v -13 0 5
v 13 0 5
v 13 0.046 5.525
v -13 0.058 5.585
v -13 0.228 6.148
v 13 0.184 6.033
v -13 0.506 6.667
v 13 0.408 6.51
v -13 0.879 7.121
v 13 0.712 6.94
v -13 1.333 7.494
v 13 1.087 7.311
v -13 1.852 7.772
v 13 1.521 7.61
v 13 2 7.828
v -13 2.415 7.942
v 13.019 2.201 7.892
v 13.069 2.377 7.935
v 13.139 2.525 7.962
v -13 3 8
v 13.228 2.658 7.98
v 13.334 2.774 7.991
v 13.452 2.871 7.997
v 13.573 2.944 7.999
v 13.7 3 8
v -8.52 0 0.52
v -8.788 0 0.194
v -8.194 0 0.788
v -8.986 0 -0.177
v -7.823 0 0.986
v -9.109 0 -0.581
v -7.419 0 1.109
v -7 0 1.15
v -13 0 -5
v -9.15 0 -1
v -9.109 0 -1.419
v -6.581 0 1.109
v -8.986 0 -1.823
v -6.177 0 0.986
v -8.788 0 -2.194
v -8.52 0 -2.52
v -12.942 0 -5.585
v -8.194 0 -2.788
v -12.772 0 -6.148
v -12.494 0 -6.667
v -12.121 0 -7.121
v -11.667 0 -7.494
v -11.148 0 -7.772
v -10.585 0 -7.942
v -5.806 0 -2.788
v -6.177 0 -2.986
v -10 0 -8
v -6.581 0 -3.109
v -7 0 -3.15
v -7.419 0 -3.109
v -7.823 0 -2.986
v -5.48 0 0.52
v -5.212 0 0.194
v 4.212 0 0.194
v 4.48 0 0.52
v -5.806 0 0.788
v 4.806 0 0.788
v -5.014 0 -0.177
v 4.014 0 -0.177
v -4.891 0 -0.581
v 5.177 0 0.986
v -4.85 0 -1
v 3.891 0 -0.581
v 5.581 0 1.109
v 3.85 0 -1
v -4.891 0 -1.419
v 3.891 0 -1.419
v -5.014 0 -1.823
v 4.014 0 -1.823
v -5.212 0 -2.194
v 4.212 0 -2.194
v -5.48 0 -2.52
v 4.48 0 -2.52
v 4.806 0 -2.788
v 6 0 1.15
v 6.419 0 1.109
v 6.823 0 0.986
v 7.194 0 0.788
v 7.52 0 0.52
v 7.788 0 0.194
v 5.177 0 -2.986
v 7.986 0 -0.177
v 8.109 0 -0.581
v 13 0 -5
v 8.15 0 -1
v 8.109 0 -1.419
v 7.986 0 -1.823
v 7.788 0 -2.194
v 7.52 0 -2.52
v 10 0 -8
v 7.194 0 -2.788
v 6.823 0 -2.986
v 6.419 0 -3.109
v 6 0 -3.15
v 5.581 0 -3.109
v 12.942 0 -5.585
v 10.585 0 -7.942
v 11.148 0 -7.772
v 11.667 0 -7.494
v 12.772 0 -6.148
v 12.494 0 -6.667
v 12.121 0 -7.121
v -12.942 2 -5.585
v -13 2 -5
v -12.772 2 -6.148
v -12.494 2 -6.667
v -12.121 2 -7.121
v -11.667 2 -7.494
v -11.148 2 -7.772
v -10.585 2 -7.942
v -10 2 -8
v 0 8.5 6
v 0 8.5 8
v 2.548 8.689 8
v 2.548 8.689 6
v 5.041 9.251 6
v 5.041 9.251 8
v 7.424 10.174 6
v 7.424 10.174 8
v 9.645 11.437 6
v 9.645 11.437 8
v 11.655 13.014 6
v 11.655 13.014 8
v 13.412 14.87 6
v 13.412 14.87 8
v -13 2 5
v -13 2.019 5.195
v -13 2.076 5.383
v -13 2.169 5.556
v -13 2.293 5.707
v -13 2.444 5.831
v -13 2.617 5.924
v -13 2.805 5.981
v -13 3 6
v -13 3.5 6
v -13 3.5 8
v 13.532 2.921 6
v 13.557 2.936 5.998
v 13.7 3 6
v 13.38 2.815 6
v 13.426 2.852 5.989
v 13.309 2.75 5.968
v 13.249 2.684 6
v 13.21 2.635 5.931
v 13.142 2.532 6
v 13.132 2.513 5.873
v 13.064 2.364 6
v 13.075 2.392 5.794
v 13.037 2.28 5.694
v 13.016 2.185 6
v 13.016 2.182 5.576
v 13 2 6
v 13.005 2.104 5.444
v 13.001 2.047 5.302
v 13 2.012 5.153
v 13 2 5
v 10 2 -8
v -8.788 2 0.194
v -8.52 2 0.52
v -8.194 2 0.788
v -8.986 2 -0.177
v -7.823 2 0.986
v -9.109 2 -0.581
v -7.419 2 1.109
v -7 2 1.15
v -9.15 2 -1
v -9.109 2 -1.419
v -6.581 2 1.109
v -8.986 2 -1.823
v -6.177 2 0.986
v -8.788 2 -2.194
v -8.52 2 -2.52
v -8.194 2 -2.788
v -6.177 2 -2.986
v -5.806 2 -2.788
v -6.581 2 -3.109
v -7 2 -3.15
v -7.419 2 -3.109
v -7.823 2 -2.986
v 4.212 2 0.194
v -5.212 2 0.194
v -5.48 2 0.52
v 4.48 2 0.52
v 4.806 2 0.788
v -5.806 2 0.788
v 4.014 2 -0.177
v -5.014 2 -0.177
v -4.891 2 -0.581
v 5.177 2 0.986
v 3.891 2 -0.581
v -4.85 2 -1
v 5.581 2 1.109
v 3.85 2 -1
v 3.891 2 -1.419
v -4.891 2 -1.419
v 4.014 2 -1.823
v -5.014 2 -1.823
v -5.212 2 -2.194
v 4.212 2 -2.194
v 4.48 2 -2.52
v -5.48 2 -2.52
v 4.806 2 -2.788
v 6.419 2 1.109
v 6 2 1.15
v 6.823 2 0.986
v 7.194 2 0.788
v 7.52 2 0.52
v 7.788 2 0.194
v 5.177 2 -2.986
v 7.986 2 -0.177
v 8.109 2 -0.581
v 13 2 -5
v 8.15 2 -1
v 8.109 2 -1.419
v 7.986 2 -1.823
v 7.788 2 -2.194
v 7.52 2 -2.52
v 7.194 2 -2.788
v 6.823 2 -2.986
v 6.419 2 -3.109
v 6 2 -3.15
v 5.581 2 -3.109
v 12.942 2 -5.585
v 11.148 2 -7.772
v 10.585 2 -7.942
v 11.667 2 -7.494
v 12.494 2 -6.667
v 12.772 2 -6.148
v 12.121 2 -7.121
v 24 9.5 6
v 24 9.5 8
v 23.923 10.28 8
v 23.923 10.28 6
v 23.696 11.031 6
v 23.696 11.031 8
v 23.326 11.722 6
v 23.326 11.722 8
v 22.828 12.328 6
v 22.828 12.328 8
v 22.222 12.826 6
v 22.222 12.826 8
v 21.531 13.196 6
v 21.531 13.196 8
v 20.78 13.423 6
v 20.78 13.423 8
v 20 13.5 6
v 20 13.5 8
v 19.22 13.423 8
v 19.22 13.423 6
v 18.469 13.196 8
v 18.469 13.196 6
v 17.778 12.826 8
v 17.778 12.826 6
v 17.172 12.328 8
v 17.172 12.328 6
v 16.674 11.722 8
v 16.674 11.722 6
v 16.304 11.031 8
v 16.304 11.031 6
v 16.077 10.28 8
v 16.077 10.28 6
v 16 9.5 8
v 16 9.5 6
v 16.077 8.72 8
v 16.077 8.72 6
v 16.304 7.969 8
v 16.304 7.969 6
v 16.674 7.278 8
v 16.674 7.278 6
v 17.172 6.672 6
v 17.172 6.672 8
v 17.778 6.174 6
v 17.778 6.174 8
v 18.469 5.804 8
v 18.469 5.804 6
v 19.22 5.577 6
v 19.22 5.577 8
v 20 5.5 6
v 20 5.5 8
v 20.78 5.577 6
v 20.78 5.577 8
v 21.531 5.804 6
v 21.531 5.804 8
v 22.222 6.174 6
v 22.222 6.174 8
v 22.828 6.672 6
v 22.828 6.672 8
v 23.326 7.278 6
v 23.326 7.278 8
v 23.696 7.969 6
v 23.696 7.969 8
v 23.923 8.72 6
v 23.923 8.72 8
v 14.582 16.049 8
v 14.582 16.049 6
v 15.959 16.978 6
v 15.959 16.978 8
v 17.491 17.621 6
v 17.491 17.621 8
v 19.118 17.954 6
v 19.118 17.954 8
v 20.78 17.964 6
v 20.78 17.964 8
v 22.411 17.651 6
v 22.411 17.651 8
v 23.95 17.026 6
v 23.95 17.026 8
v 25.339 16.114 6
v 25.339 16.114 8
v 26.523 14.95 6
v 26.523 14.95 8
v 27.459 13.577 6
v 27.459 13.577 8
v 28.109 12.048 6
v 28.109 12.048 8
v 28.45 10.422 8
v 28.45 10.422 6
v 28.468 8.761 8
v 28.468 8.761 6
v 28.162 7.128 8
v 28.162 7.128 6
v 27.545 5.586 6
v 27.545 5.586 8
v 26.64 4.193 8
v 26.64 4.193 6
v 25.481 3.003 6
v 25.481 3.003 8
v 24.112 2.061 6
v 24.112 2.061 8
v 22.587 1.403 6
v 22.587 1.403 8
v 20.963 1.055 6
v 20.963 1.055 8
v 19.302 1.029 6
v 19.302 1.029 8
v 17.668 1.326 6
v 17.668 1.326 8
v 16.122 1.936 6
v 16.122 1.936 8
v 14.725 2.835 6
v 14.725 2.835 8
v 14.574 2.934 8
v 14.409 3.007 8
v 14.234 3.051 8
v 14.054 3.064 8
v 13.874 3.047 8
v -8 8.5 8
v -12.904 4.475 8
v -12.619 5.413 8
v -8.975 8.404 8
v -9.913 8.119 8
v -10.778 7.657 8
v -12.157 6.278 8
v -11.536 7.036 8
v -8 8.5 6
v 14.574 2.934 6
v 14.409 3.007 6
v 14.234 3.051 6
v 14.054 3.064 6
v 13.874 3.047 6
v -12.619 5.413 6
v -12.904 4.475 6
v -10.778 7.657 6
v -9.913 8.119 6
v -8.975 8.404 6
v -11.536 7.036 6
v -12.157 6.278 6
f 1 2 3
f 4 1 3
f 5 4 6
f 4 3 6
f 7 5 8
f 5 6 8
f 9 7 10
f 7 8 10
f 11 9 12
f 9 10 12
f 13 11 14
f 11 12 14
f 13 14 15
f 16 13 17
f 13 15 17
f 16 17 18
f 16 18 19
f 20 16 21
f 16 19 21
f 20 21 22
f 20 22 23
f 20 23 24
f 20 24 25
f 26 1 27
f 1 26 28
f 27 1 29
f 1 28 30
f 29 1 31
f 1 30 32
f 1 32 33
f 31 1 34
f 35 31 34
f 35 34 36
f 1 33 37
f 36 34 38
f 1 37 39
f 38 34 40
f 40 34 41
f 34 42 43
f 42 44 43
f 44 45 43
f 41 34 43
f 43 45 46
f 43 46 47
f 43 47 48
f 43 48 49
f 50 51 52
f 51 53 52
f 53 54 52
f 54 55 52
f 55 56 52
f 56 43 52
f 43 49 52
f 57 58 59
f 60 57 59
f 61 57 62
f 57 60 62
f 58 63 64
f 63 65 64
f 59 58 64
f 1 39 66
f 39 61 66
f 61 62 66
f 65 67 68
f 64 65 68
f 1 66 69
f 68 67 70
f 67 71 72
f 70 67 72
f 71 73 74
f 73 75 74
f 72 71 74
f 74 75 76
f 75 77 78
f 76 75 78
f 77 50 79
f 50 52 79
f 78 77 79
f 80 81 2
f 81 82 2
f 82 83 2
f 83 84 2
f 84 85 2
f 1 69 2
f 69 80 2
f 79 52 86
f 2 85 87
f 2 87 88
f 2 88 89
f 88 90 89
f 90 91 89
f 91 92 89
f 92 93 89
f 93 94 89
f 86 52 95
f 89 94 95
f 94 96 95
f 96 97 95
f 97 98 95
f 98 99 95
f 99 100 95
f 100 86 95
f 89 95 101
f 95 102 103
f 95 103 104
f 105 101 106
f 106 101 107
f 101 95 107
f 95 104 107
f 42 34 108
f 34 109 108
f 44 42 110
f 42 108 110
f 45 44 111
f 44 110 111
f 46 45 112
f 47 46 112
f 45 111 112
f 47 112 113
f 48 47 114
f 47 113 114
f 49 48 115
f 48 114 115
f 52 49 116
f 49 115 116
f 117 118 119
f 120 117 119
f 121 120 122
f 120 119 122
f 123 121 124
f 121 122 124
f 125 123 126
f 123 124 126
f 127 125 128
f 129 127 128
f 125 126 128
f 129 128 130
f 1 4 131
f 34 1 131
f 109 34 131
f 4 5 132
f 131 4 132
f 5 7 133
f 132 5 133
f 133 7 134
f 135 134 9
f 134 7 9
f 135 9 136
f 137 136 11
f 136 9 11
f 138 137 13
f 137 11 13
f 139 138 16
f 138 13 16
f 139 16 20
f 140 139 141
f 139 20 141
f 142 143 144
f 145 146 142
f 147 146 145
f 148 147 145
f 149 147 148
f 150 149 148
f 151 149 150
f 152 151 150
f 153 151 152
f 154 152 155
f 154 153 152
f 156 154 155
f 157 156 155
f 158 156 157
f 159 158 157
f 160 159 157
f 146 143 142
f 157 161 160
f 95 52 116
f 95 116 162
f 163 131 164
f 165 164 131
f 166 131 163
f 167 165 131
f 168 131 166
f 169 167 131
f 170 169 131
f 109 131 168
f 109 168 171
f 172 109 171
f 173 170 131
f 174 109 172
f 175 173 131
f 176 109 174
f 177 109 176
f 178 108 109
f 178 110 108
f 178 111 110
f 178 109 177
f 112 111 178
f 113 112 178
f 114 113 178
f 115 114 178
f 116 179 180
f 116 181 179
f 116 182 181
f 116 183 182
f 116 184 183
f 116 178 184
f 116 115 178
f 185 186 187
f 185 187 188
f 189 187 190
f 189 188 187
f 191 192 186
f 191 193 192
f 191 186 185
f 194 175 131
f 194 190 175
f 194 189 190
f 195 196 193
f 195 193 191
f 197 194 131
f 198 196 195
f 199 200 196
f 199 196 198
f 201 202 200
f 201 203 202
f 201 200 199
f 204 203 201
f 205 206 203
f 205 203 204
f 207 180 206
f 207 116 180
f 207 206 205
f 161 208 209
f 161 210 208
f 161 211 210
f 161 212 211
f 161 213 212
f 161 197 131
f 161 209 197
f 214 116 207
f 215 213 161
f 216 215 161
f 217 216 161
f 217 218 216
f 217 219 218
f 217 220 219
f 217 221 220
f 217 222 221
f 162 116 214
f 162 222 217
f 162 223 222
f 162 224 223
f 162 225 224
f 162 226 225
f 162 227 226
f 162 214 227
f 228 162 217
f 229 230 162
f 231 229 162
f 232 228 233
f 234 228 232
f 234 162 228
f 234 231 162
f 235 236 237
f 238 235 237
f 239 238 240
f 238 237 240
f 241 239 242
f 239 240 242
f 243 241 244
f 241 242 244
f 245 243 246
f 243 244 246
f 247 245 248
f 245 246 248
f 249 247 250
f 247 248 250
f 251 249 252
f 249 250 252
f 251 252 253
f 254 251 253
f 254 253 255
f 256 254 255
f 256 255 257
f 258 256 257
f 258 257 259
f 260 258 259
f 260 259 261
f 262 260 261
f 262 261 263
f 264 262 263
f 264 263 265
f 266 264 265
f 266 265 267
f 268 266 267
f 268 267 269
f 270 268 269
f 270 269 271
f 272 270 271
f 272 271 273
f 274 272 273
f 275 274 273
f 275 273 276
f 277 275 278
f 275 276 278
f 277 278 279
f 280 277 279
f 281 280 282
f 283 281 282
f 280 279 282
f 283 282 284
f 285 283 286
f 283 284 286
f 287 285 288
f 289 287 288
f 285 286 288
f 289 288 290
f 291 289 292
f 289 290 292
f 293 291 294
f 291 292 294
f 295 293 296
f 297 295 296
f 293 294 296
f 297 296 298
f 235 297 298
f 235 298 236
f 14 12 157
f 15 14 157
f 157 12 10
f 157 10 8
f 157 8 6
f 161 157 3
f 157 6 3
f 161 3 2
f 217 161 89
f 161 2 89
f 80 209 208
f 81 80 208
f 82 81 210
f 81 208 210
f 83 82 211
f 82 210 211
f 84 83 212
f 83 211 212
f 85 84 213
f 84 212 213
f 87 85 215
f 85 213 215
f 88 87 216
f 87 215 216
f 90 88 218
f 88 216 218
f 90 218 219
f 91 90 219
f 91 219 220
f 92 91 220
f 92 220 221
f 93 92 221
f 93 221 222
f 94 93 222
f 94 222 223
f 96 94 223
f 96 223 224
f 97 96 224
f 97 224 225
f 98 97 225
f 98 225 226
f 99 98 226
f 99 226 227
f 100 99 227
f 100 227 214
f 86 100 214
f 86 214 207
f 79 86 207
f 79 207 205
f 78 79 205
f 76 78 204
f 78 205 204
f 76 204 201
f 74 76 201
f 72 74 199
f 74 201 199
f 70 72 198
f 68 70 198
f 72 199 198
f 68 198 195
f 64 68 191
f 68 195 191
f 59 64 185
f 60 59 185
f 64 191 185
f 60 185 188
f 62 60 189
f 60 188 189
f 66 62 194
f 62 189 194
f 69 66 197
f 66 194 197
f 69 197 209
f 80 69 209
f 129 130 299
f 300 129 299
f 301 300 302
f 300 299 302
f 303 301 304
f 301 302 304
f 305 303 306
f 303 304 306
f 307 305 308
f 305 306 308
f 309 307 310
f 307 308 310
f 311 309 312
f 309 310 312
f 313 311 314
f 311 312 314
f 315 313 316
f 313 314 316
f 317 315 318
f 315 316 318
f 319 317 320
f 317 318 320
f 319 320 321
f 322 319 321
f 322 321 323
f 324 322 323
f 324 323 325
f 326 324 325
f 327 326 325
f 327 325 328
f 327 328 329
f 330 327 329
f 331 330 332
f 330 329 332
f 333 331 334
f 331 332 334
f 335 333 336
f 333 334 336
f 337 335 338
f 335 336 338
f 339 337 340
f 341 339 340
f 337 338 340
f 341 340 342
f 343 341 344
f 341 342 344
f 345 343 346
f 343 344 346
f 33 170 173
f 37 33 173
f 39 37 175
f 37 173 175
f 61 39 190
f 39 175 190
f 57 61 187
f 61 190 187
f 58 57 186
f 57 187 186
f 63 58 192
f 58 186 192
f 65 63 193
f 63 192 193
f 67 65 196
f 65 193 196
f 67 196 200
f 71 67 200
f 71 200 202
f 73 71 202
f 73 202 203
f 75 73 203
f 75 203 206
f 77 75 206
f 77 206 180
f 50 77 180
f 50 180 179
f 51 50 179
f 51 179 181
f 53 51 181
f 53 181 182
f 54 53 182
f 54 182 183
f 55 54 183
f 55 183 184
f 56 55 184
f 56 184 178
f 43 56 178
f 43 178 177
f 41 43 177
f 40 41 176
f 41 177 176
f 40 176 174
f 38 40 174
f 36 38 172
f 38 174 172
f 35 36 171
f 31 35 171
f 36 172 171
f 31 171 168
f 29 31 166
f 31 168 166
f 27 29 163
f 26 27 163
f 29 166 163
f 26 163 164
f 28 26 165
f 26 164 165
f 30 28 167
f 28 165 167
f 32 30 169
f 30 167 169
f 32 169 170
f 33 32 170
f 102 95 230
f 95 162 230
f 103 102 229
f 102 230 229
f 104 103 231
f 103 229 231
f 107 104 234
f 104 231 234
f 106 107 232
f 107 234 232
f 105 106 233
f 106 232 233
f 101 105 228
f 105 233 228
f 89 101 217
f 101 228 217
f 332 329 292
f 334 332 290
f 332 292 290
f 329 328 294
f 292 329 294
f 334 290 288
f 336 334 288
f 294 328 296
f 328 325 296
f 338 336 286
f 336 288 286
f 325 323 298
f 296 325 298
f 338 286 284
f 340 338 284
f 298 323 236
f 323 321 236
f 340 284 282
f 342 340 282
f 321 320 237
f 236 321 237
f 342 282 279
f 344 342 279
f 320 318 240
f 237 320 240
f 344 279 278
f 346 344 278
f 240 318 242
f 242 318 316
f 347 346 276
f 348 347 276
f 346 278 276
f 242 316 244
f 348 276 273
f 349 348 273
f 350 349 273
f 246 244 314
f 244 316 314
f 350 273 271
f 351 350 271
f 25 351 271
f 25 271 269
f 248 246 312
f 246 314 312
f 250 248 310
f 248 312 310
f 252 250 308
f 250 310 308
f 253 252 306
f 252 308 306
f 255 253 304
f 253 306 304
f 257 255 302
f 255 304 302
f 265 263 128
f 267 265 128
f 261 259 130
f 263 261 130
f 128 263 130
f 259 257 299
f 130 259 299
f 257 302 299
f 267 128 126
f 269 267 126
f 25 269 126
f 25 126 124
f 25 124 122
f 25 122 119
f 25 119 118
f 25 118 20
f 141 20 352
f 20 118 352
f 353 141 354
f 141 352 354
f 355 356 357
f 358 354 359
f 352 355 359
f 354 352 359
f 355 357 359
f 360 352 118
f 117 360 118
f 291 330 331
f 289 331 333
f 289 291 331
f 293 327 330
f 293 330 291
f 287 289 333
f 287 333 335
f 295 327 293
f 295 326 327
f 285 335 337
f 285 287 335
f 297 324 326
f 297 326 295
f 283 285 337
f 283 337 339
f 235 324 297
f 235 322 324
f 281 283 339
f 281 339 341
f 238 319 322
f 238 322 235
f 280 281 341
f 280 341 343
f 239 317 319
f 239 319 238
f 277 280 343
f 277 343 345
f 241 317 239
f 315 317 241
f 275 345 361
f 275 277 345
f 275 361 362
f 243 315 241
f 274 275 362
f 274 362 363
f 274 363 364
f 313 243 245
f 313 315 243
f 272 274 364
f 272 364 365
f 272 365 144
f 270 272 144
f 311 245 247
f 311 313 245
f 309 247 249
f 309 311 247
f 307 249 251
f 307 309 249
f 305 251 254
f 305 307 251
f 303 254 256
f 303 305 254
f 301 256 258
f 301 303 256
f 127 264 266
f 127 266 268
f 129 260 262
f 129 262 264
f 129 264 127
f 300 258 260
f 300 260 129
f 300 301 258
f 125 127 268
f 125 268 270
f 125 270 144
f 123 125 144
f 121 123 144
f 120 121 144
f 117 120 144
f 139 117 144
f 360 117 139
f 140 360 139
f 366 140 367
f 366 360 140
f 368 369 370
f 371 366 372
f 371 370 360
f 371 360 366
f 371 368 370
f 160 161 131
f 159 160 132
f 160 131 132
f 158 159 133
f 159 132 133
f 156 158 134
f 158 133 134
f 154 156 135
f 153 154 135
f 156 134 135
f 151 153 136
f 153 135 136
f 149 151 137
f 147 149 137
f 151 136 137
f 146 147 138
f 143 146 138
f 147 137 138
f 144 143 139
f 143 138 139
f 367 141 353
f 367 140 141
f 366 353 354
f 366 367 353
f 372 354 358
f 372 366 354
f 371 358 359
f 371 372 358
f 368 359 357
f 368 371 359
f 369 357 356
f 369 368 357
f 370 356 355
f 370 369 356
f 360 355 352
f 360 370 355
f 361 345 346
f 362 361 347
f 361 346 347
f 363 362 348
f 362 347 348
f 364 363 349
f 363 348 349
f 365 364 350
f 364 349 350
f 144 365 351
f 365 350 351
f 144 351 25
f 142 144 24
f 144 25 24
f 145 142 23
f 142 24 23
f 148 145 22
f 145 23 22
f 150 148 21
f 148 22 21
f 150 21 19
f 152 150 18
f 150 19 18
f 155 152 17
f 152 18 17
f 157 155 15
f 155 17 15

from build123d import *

# Parameters (mm, degrees)
SKETCH_1_W          = 26
SKETCH_1_H          = 16
EXTRUDE_1_DEPTH     = 2
EXTRUDE_2_DEPTH     = 2
FILLET_1_R          = 5
FILLET_2_R          = 3
SKETCH_4_R          = 4
CUT_EXTRUDE_1_DEPTH = 38.312866414
SKETCH_5_R          = 2.15
CUT_EXTRUDE_2_DEPTH = 34.648922717
FILLET_3_R          = 3
FILLET_START        = -13
FILLET_4_DEPTH      = 26.69955789
FILLET_START_2      = 4
FILLET_4_2_DEPTH    = 2


with BuildPart() as part:
    # 草图1 → 凸台-拉伸1 (new body)
    with BuildSketch(Plane(origin=(0, 0, 0), x_dir=(1, 0, 0), z_dir=(0, 1, 0))):
        Rectangle(SKETCH_1_W, SKETCH_1_H)
    extrude(amount=EXTRUDE_1_DEPTH)

    # 草图3 → 凸台-拉伸2 (add)
    with BuildSketch(Plane.XY.offset(8)):
        with BuildLine():
            Line((-13, 2), (-13, 8.5))
            Line((-13, 8.5), (0, 8.5))
            ThreePointArc((0, 8.5), (7.423811989, 10.173553708), (13.411524732, 14.870474248))
            ThreePointArc((13.411524732, 14.870474248), (28.449822139, 10.422228722), (14.725126476, 2.834738617))
            ThreePointArc((14.725126476, 2.834738617), (13.600854496, 2.958234042), (13, 2))
            Line((13, 2), (-13, 2))
        make_face()
    extrude(amount=-EXTRUDE_2_DEPTH)

    # 圆角1
    fillet_1_edges = [part.edges().sort_by_distance(p)[0] for p in [
        (-13, 8.5, 7),
    ]]
    fillet(fillet_1_edges, radius=FILLET_1_R)

    # 圆角2
    fillet_2_edges = [part.edges().sort_by_distance(p)[0] for p in [
        (-13, 1, -8),
        (13, 1, -8),
    ]]
    fillet(fillet_2_edges, radius=FILLET_2_R)

    # 草图4 → 切除-拉伸1 (cut, through all)
    with BuildSketch(Plane.XY.offset(8)):
        with Locations((20, 9.5)):
            Circle(SKETCH_4_R)
    extrude(amount=-CUT_EXTRUDE_1_DEPTH, mode=Mode.SUBTRACT)

    # 草图5 → 切除-拉伸2 (cut, through all)
    with BuildSketch(Plane(origin=(0, 2, 0), x_dir=(1, 0, 0), z_dir=(0, 1, 0))):
        with Locations(Location((-7, 1, 0), (0, 0, 270))):
            Circle(SKETCH_5_R)
        with Locations(Location((6, 1, 0), (0, 0, 270))):
            Circle(SKETCH_5_R)
    extrude(amount=-CUT_EXTRUDE_2_DEPTH, mode=Mode.SUBTRACT)

    # 圆角3
    fillet_3_edges = [part.edges().sort_by_distance(p)[0] for p in [
        (0, 0, 8),
    ]]
    fillet(fillet_3_edges, radius=FILLET_3_R)

    # 圆角4: read off the stored shape, not the designer's step
    # 圆角4 outline → 圆角4 (add)
    with BuildSketch(Plane.YZ.offset(FILLET_START)):
        with BuildLine():
            ThreePointArc((2, 5), (2.292893219, 5.707106781), (3, 6))
            Line((3, 6), (2, 6))
            Line((2, 6), (2, 5))
        make_face()
    extrude(amount=FILLET_4_DEPTH)

    # Fillet 4 2 outline → Fillet 4 2 (cut)
    with BuildSketch(Plane.XY.offset(FILLET_START_2)):
        with BuildLine():
            Line((13.69955789, 2), (13.699557878, 3.000000032))
            ThreePointArc((13.699557878, 3.000000032), (13.19224914, 2.610200695), (13, 1.999999133))
            Line((13, 1.999999133), (13.69955789, 2))
        make_face()
    extrude(amount=FILLET_4_2_DEPTH, mode=Mode.SUBTRACT)


solid = part.part
